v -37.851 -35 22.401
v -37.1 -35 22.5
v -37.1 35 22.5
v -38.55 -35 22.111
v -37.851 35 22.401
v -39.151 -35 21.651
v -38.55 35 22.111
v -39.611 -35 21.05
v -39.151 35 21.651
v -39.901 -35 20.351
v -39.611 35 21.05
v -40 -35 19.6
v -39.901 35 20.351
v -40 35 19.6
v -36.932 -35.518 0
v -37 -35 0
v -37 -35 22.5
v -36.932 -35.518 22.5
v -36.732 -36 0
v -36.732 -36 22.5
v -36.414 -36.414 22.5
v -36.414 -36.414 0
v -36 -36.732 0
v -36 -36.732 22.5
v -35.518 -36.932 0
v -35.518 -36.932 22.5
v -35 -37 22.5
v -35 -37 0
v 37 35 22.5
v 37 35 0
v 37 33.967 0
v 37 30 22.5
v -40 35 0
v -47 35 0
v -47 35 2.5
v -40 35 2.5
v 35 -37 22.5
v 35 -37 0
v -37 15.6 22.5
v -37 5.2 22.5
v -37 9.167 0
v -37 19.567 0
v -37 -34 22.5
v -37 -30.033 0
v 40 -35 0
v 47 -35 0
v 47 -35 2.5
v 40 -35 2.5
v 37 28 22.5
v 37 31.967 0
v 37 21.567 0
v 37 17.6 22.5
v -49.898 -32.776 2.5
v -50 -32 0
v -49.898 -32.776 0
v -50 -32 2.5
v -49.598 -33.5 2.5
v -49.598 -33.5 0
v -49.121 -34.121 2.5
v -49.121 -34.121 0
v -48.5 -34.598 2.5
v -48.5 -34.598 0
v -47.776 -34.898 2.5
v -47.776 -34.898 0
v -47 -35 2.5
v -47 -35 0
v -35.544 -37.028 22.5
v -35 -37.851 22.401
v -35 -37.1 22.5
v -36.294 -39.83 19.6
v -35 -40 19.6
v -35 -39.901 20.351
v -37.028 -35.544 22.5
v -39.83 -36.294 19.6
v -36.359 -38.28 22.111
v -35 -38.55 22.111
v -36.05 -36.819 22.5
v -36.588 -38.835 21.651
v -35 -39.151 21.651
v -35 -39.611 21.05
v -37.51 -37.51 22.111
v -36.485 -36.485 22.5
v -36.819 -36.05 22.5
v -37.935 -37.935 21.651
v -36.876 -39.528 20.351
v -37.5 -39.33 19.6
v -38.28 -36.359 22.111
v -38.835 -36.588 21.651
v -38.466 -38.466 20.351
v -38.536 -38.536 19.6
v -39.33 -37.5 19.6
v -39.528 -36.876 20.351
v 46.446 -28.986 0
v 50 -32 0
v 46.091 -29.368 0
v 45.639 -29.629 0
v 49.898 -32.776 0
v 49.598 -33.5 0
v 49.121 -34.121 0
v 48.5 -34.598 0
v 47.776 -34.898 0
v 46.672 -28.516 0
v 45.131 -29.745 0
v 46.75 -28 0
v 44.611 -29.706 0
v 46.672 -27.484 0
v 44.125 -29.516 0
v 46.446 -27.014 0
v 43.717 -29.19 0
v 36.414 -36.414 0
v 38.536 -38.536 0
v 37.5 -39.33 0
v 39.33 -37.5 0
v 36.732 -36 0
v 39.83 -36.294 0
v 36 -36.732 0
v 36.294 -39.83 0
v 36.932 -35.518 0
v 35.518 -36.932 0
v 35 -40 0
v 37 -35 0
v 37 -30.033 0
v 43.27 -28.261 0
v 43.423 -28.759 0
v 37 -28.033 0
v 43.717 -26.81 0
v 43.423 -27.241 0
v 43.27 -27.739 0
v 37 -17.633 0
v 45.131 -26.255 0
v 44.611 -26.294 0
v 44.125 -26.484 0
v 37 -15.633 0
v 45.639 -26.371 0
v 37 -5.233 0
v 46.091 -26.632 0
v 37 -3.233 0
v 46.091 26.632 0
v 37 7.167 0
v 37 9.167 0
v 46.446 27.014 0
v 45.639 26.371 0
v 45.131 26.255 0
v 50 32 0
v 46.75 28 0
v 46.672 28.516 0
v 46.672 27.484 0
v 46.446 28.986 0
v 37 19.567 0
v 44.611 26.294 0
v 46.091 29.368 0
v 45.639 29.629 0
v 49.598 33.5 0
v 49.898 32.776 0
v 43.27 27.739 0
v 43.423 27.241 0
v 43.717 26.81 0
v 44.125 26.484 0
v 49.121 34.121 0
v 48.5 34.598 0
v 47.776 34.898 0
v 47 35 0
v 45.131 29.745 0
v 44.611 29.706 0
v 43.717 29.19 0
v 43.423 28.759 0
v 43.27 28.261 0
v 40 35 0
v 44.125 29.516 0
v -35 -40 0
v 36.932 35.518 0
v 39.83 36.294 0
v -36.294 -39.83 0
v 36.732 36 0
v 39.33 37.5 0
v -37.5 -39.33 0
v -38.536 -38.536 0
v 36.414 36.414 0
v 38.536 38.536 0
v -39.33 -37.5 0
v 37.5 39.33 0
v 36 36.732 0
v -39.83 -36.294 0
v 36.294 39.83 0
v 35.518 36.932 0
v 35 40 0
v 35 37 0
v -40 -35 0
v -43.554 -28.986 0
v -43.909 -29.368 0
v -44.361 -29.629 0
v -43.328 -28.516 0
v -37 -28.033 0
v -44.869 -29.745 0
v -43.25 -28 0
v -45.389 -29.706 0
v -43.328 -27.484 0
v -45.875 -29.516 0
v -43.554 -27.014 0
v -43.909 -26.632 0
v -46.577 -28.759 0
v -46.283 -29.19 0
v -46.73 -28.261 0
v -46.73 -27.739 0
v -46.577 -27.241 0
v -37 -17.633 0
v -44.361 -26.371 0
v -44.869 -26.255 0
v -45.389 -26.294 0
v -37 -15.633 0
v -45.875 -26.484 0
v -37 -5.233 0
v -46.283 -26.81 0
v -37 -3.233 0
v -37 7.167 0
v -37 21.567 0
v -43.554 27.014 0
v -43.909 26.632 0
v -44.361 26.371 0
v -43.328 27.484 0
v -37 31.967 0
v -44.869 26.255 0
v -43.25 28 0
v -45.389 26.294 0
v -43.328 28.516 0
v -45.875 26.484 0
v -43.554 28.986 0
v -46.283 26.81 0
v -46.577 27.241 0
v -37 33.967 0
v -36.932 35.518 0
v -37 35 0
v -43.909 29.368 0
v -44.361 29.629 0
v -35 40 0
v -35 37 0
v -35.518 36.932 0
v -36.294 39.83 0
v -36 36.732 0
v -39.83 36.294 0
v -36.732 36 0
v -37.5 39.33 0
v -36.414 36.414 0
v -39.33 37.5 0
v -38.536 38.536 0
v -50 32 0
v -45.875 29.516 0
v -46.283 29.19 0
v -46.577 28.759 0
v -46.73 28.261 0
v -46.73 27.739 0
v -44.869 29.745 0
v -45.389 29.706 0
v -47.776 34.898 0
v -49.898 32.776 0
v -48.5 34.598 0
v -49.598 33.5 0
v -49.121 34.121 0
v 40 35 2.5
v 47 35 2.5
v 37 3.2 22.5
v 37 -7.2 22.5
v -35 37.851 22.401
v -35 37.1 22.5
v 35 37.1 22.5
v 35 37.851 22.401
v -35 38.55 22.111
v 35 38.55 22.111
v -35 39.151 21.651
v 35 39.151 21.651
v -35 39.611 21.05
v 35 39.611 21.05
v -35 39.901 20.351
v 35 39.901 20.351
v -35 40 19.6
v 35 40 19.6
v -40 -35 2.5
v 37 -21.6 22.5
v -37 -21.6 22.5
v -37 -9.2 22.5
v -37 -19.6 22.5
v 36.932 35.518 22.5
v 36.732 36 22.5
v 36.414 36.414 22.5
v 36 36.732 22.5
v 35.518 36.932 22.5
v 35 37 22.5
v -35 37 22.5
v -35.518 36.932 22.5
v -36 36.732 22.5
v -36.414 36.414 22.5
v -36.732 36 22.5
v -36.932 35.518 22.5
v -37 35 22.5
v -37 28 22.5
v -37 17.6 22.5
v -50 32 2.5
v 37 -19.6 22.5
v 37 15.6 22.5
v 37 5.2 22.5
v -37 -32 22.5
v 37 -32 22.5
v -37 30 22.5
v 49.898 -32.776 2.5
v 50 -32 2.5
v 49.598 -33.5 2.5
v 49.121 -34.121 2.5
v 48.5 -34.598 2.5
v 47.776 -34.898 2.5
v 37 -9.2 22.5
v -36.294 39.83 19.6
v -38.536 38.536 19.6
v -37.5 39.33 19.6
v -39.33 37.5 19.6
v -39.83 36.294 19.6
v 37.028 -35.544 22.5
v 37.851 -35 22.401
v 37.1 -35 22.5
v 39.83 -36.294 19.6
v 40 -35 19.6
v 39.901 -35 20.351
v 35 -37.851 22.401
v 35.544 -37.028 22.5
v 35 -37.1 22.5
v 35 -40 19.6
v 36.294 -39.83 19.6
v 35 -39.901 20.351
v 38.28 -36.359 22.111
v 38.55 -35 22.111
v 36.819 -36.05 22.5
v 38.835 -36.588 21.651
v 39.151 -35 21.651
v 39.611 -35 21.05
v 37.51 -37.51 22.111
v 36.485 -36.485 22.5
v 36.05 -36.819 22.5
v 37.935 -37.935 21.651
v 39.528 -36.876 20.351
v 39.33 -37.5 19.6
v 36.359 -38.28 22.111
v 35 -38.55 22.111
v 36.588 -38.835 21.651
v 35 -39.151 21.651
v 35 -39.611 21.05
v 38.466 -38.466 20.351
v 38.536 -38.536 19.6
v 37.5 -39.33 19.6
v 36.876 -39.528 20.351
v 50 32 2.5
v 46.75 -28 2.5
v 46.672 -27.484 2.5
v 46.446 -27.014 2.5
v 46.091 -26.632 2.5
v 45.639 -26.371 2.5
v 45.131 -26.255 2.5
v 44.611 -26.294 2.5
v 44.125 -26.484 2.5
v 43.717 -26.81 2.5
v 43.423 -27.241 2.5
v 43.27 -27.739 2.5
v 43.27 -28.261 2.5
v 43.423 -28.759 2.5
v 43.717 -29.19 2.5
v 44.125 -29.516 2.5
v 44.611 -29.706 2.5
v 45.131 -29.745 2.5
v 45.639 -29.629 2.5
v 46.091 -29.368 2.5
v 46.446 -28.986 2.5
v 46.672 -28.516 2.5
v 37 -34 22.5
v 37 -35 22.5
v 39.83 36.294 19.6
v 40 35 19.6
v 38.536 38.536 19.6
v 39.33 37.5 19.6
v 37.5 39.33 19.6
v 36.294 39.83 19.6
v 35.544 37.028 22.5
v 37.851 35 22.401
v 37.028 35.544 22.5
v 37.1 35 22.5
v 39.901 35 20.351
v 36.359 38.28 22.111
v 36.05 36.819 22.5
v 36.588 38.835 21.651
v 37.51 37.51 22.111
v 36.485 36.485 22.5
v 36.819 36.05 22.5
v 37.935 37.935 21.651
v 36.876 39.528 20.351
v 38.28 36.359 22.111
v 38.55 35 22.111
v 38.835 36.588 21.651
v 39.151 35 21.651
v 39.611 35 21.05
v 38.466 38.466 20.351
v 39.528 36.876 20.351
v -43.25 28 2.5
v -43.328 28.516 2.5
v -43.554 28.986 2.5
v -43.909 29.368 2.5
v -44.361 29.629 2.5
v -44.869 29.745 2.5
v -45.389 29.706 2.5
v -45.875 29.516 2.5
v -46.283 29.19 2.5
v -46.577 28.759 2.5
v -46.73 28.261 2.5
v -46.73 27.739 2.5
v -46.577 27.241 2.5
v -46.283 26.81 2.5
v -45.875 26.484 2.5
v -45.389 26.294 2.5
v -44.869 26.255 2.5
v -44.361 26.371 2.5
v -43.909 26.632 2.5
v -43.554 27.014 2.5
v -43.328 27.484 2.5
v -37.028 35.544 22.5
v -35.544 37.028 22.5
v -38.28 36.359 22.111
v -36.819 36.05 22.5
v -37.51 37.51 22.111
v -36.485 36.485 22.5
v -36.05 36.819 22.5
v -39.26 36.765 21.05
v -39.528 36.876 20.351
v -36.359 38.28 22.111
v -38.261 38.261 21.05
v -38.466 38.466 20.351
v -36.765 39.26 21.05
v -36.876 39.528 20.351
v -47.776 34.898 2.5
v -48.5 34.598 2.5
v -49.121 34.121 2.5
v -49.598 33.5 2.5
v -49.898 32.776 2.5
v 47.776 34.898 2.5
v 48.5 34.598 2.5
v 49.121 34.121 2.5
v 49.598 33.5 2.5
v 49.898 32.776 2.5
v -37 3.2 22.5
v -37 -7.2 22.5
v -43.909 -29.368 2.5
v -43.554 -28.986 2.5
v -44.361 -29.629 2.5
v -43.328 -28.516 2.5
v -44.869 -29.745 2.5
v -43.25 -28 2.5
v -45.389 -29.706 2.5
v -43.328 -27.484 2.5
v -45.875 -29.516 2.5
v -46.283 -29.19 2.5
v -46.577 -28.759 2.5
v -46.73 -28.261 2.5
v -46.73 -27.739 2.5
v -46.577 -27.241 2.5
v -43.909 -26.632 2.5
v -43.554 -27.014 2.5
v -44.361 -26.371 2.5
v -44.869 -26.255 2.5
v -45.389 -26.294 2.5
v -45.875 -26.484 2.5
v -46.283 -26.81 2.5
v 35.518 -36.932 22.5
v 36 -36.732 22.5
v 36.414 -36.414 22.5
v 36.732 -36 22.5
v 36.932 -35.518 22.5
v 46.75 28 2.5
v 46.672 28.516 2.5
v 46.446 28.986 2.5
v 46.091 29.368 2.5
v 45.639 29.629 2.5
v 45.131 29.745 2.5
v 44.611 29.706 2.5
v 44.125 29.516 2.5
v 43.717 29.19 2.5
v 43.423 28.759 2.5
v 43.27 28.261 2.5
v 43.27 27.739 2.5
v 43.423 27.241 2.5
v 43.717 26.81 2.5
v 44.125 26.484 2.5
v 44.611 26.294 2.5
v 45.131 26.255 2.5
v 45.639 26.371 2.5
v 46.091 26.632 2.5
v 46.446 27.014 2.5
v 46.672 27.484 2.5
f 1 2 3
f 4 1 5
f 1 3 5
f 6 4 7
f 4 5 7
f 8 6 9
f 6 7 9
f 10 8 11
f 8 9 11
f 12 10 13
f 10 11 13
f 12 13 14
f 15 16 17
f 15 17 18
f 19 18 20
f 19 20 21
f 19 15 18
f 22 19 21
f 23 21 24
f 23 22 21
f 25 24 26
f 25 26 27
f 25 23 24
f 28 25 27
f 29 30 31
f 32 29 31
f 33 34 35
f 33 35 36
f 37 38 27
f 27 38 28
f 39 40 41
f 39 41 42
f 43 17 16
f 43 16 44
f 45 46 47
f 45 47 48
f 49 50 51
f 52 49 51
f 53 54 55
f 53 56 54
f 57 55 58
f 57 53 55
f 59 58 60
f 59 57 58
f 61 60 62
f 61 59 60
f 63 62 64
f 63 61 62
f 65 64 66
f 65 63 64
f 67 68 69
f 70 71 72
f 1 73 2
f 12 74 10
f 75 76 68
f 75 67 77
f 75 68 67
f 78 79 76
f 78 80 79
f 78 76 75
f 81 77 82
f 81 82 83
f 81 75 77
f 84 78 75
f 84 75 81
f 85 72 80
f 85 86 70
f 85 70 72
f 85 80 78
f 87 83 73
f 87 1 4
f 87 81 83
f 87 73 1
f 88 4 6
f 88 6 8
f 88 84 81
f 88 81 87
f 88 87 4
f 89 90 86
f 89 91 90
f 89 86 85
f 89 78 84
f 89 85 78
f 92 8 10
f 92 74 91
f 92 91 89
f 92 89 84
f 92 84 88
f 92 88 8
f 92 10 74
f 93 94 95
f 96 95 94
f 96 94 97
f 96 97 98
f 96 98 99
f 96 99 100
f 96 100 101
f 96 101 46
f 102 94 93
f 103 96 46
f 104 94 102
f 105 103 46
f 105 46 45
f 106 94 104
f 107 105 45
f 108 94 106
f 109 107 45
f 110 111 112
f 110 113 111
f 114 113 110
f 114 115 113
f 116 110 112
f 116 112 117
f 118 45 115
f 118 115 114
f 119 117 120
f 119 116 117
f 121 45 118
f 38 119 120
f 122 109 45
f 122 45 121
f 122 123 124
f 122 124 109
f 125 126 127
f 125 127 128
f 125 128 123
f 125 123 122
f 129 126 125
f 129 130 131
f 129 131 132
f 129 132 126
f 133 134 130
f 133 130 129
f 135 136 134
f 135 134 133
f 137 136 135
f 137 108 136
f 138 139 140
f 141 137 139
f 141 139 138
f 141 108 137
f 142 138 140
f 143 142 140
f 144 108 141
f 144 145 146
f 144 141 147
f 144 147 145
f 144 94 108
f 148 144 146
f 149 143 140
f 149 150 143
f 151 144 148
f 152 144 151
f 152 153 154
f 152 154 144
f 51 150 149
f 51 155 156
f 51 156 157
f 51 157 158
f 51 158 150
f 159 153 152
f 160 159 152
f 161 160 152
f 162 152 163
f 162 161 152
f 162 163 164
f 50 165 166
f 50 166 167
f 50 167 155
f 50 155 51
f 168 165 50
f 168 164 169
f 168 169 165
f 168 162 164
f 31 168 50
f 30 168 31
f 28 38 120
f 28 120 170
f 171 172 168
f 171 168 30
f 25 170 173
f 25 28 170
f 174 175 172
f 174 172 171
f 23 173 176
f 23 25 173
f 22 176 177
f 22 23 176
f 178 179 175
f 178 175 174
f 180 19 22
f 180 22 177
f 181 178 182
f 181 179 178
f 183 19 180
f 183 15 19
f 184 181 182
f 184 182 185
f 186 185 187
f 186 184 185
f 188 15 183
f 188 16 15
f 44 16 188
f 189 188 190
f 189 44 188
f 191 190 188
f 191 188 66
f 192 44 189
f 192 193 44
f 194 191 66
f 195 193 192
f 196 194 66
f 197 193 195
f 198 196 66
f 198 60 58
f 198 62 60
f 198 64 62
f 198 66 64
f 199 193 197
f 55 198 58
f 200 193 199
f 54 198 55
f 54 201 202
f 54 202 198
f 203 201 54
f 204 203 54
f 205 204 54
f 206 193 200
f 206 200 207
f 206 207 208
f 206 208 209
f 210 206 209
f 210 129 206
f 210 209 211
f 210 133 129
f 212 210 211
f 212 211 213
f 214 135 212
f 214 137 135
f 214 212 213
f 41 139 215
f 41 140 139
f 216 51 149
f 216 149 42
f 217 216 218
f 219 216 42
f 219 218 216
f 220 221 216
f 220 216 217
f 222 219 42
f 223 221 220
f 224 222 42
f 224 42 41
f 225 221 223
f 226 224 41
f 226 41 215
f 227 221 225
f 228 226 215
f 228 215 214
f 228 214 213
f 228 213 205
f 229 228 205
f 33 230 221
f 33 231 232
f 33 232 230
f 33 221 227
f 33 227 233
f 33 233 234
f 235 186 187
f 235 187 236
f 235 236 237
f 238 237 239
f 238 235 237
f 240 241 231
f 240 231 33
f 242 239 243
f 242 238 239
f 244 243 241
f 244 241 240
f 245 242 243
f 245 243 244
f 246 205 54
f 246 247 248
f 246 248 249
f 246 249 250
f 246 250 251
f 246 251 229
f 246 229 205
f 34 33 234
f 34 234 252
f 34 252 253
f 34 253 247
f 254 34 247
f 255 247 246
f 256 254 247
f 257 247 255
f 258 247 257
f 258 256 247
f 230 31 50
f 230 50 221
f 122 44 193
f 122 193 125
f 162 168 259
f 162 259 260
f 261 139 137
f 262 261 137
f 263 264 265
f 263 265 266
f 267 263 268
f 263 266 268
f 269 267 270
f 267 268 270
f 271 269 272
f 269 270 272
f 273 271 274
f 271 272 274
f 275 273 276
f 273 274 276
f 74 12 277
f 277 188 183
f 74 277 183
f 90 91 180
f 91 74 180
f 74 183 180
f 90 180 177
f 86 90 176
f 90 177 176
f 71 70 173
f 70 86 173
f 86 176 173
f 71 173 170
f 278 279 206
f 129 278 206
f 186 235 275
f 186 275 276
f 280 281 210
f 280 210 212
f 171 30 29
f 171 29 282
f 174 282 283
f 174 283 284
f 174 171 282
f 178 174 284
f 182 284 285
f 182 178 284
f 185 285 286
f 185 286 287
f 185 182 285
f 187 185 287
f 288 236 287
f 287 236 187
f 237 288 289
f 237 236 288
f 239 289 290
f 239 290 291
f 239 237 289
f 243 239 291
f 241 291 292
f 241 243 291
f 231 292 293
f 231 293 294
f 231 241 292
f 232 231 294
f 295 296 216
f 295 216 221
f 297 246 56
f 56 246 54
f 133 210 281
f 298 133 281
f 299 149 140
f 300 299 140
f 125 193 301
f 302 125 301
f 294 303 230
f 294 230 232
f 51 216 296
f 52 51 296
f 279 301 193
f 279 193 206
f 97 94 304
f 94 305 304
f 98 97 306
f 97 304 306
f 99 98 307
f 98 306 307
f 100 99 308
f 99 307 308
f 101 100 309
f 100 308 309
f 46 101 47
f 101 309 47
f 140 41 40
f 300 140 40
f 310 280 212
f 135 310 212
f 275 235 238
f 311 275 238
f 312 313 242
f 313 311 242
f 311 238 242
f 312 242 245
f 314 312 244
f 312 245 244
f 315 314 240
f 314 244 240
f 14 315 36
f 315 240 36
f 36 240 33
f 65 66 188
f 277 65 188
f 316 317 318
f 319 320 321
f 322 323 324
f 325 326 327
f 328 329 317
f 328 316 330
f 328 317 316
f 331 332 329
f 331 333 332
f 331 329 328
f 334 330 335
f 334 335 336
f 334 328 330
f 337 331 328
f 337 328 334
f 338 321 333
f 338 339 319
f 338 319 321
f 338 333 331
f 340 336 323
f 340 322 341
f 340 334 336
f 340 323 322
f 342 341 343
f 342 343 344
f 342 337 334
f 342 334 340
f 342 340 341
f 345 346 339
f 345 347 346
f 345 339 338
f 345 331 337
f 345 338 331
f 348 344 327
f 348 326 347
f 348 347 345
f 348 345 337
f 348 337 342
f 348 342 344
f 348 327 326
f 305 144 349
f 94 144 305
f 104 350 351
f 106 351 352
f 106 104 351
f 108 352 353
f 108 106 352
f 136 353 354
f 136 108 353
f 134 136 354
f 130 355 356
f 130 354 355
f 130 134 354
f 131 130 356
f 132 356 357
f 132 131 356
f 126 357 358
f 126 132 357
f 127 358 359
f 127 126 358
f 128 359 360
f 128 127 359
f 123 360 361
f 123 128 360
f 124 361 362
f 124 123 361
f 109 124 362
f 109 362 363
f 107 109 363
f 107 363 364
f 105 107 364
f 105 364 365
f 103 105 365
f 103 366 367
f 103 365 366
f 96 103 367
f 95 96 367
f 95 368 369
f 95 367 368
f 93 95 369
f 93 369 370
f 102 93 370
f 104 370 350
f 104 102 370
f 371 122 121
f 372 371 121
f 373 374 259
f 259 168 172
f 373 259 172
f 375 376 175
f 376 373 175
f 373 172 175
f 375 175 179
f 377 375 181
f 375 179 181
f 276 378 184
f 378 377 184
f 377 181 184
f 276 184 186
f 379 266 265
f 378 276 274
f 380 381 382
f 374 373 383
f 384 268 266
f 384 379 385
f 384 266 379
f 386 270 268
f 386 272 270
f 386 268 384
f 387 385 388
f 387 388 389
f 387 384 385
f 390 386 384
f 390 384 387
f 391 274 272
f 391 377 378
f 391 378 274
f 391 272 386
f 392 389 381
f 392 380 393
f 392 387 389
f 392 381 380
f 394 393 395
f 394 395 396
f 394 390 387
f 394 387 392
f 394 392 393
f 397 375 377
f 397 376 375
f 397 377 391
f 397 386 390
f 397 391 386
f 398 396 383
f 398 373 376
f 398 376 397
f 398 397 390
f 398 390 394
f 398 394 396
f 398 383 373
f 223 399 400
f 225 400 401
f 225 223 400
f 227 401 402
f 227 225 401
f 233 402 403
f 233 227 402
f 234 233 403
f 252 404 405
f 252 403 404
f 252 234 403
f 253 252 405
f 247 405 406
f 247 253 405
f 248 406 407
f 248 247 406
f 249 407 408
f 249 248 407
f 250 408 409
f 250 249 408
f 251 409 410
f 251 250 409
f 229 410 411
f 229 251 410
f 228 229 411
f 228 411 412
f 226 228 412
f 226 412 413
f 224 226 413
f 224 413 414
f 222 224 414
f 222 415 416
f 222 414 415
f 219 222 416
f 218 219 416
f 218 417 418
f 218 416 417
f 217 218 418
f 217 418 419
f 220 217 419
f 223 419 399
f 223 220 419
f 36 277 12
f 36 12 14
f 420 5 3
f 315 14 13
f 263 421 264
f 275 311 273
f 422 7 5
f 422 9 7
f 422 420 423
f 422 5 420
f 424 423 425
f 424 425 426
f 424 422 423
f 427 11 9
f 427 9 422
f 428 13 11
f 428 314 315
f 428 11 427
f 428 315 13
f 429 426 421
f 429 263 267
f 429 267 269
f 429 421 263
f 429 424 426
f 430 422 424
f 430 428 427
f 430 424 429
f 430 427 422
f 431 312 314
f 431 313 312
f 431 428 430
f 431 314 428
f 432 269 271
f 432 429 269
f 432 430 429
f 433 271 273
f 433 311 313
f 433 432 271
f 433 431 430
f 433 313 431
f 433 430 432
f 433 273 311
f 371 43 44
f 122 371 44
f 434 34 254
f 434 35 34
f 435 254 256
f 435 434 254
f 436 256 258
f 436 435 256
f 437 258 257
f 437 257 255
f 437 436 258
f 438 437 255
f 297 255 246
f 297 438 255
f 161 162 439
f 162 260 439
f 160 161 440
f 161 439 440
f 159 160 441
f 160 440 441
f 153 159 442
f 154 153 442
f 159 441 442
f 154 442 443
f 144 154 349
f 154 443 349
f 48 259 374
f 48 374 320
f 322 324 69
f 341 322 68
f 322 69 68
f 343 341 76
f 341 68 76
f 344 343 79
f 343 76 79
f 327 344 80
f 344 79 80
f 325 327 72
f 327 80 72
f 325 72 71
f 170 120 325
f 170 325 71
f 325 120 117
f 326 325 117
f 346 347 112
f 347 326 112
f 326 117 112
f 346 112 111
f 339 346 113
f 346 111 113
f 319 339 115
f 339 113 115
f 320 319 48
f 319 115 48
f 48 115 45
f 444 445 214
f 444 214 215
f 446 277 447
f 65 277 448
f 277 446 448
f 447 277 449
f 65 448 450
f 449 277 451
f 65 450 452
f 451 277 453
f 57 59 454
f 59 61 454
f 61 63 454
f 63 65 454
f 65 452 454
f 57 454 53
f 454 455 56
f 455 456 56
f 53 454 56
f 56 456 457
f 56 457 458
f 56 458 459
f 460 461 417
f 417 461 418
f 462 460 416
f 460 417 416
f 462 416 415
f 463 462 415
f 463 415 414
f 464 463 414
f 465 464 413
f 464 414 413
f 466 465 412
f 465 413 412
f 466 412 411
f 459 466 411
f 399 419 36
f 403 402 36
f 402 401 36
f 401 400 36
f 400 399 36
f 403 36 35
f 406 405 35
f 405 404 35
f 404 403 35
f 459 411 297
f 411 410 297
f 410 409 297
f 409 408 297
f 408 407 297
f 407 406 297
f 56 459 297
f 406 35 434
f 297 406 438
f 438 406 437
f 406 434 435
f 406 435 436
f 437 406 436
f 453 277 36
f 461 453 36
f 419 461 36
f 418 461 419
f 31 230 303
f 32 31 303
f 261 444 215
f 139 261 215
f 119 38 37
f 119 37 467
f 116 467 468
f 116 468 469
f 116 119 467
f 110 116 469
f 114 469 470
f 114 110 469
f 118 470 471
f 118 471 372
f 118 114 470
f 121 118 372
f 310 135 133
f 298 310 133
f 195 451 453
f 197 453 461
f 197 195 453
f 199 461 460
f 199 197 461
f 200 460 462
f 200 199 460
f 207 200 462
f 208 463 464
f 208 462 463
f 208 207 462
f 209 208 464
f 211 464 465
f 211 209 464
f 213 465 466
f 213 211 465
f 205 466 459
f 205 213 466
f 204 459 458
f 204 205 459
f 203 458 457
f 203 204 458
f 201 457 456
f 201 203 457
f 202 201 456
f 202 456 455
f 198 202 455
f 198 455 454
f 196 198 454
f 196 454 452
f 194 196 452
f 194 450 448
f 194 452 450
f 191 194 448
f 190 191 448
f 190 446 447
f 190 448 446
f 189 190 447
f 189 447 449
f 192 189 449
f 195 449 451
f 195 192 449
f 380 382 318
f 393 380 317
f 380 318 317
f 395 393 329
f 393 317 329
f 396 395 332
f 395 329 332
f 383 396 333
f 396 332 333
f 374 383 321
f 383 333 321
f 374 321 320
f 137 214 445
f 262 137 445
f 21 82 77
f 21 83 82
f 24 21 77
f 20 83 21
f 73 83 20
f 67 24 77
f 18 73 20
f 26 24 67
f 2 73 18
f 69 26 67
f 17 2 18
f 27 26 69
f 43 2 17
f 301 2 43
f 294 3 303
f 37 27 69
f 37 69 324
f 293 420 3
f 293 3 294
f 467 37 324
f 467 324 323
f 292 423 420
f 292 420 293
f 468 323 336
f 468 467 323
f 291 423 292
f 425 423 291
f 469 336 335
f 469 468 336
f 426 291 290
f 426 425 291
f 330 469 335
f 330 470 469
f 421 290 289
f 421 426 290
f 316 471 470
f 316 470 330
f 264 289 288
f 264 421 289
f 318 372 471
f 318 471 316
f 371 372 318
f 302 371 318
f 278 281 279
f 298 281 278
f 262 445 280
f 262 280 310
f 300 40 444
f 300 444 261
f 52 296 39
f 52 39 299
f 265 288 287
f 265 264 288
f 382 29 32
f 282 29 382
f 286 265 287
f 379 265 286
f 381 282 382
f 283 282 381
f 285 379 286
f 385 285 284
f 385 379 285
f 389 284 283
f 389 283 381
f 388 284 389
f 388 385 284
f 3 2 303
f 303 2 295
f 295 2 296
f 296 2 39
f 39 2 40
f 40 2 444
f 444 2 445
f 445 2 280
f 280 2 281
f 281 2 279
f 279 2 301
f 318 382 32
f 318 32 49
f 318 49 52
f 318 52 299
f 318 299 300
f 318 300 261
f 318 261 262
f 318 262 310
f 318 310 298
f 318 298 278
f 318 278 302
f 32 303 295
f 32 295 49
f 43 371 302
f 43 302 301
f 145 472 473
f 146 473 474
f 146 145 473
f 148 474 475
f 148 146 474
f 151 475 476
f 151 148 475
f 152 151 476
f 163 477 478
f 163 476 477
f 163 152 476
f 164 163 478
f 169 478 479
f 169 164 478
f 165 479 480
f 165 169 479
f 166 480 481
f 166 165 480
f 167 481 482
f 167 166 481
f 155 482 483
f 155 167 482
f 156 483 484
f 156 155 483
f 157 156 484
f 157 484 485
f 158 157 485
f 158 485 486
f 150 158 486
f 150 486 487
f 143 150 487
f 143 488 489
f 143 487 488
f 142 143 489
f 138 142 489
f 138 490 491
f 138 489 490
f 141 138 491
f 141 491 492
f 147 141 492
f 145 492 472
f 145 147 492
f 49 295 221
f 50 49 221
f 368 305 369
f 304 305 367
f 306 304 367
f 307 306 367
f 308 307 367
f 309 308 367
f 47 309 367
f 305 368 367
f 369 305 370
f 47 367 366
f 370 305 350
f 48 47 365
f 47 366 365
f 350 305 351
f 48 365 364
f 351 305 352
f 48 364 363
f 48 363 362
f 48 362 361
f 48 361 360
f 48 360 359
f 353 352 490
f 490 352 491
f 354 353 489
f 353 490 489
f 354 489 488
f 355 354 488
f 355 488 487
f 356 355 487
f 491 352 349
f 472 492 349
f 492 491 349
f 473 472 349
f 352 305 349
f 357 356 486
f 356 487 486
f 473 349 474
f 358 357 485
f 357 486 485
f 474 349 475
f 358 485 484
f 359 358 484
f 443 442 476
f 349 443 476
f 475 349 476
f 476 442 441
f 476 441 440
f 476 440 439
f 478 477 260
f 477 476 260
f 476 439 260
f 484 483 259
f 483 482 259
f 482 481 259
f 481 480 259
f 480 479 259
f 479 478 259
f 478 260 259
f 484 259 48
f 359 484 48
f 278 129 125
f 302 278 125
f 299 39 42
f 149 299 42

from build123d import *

# Parameters (mm, degrees)
PAD_DEPTH           = 2.5
FILLET_R            = 3
SKETCH002_R         = 1.75
POCKET_DEPTH        = 0.001
POCKET_DEPTH_BACK   = -2.501
PAD001_DEPTH        = 20
FILLET001_R         = 2.9
PAD002_DEPTH        = 74
LINEARPATTERN_COUNT = 6
LINEARPATTERN_PITCH = 12.4


with BuildPart() as part:
    # Sketch001 → Pad (new body)
    with BuildSketch(Plane.XY):
        with BuildLine():
            Line((-50, 35), (-40, 35))
            ThreePointArc((-35, 40), (-38.535534, 38.535534), (-40, 35))
            Line((-35, 40), (35, 40))
            ThreePointArc((40, 35), (38.535534, 38.535534), (35, 40))
            Line((40, 35), (50, 35))
            Line((50, 35), (50, -35))
            Line((50, -35), (40, -35))
            ThreePointArc((35, -40), (38.535534, -38.535534), (40, -35))
            Line((35, -40), (-35, -40))
            ThreePointArc((-40, -35), (-38.535534, -38.535534), (-35, -40))
            Line((-50, -35), (-40, -35))
            Line((-50, 35), (-50, -35))
        make_face()
        with BuildLine():
            ThreePointArc((-35, 37), (-36.414214, 36.414214), (-37, 35))
            Line((-37, -35), (-37, 35))
            ThreePointArc((-37, -35), (-36.414214, -36.414214), (-35, -37))
            Line((35, -37), (-35, -37))
            ThreePointArc((35, -37), (36.414214, -36.414214), (37, -35))
            Line((37, 35), (37, -35))
            ThreePointArc((37, 35), (36.414214, 36.414214), (35, 37))
            Line((-35, 37), (35, 37))
        make_face(mode=Mode.SUBTRACT)
    extrude(amount=PAD_DEPTH)

    # Fillet
    fillet_edges = [part.edges().sort_by_distance(p)[0] for p in [
        (-50, -35, 1.25),
        (50, -35, 1.25),
        (-50, 35, 1.25),
        (50, 35, 1.25),
    ]]
    fillet(fillet_edges, radius=FILLET_R)

    # Sketch002 → Pocket (cut, two sides)
    with BuildSketch(Plane.XY) as pocket_sk:
        with Locations((-45, 28)):
            Circle(SKETCH002_R)
        with Locations((-45, -28)):
            Circle(SKETCH002_R)
        with Locations((45, -28)):
            Circle(SKETCH002_R)
        with Locations((45, 28)):
            Circle(SKETCH002_R)
    extrude(amount=-POCKET_DEPTH, mode=Mode.SUBTRACT)
    extrude(pocket_sk.sketch, amount=-POCKET_DEPTH_BACK, mode=Mode.SUBTRACT)

    # Sketch003 → Pad001 (join)
    with BuildSketch(Plane.XY.offset(2.5)):
        with BuildLine():
            ThreePointArc((-35, 40), (-38.535534, 38.535534), (-40, 35))
            Line((-40, -35), (-40, 35))
            ThreePointArc((-40, -35), (-38.535534, -38.535534), (-35, -40))
            Line((35, -40), (-35, -40))
            ThreePointArc((35, -40), (38.535534, -38.535534), (40, -35))
            Line((40, 35), (40, -35))
            ThreePointArc((40, 35), (38.535534, 38.535534), (35, 40))
            Line((-35, 40), (35, 40))
        make_face()
        with BuildLine():
            ThreePointArc((-35, 37), (-36.414214, 36.414214), (-37, 35))
            Line((-37, -35), (-37, 35))
            ThreePointArc((-37, -35), (-36.414214, -36.414214), (-35, -37))
            Line((35, -37), (-35, -37))
            ThreePointArc((35, -37), (36.414214, -36.414214), (37, -35))
            Line((37, 35), (37, -35))
            ThreePointArc((37, 35), (36.414214, 36.414214), (35, 37))
            Line((-35, 37), (35, 37))
        make_face(mode=Mode.SUBTRACT)
    extrude(amount=PAD001_DEPTH)

    # Fillet001
    fillet001_edges = [part.edges().sort_by_distance(p)[0] for p in [
        (0, 40, 22.5),
    ]]
    fillet(fillet001_edges, radius=FILLET001_R)

    # Sketch004 → Pad002 (join)
    with BuildSketch(Plane.YZ.offset(-37)):
        Polygon((33.967357, 0), (30, 22.5), (28, 22.5), (31.967357, 0), align=None)
    pad002 = extrude(amount=PAD002_DEPTH)

    # LinearPattern: Pad002 ×6
    with Locations(*[(0, -i * LINEARPATTERN_PITCH, 0) for i in range(1, LINEARPATTERN_COUNT)]):
        add(pad002)


solid = part.part
